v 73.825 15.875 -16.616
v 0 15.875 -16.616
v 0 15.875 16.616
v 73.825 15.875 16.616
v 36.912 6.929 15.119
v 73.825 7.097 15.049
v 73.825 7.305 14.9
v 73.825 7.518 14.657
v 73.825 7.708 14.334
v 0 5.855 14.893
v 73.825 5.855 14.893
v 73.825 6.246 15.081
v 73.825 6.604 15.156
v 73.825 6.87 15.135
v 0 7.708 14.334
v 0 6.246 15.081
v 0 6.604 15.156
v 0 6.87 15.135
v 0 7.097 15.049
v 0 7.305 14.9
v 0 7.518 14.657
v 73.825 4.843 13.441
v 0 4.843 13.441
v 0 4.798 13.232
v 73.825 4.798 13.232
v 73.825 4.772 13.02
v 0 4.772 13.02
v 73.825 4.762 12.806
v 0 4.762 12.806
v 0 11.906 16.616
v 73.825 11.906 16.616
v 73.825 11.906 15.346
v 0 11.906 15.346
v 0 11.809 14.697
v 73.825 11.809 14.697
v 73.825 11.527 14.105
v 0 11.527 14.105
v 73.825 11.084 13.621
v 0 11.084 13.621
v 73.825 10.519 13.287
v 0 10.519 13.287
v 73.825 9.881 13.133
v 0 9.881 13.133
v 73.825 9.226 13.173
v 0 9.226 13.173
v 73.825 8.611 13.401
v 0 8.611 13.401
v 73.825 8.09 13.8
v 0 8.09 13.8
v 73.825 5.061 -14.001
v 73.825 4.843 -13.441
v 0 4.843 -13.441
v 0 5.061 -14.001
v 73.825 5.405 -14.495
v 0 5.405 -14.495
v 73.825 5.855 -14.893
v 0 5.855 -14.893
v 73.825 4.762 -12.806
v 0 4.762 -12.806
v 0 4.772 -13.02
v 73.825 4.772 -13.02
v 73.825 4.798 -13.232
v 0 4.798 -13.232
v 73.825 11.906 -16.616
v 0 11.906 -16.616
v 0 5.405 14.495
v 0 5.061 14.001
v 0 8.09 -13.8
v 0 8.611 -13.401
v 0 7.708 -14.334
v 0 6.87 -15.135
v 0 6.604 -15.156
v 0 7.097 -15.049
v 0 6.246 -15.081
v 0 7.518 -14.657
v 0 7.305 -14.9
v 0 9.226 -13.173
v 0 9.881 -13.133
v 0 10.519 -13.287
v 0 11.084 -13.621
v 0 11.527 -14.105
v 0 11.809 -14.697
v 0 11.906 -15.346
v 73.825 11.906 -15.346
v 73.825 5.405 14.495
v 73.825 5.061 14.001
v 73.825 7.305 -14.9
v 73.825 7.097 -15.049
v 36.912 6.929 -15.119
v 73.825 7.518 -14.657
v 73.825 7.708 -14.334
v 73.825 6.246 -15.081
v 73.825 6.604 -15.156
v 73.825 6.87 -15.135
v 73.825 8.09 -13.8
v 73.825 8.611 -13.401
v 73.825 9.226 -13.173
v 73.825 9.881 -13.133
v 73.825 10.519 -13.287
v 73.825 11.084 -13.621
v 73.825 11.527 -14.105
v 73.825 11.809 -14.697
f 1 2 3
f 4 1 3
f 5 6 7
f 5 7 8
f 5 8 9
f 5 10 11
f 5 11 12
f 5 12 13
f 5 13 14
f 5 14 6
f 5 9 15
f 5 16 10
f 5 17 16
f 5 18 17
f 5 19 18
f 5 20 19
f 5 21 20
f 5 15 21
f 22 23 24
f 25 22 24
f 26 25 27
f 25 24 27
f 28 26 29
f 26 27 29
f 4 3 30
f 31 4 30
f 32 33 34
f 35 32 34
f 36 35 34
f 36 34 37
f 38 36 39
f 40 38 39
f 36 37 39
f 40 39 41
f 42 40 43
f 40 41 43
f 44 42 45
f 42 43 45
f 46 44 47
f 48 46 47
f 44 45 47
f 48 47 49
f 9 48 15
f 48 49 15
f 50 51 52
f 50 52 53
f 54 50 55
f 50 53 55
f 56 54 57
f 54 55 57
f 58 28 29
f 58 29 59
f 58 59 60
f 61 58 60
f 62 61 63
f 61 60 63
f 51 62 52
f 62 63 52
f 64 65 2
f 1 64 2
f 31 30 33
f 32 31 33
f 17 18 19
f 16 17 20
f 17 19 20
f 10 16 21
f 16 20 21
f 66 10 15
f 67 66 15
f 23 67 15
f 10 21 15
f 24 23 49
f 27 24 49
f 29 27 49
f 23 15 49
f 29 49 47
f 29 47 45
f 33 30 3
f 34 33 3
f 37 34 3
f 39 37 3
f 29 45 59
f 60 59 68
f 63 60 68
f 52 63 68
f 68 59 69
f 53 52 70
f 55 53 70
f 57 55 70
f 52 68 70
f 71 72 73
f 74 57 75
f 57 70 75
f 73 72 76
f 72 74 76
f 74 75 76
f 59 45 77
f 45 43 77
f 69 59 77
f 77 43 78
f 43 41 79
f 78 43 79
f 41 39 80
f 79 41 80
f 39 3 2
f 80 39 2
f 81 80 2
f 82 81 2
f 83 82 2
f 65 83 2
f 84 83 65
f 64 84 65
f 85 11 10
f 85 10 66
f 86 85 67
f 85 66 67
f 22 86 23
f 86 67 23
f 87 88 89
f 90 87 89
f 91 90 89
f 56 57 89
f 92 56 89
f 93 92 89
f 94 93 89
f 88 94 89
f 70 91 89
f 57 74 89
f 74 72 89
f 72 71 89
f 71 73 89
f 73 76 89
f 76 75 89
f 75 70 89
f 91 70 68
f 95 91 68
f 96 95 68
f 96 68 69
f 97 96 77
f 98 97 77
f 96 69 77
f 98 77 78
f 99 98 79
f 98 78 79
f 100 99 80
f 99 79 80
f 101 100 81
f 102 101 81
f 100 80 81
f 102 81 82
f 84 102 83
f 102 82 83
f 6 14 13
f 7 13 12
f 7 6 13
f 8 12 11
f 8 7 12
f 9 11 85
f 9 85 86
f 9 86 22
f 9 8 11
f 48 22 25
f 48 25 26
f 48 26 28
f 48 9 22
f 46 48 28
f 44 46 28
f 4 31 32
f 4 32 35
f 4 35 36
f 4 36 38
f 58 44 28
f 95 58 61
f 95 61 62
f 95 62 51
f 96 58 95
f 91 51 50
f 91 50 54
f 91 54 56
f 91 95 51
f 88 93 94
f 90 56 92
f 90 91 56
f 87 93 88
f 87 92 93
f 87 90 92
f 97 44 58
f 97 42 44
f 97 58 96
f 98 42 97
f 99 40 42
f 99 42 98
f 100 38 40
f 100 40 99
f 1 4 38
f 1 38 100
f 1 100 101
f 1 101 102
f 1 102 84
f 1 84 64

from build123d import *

# Parameters (mm, degrees)
BOSS_EXTRUDE1_DEPTH = 73.824999924


with BuildPart() as part:
    # Sketch1 → Boss-Extrude1 (new body)
    with BuildSketch(Plane(origin=(0, 0, 0), x_dir=(0, 0, -1), z_dir=(1, 0, 0))):
        with BuildLine():
            Line((-15.345833333, 15.875), (-16.615833333, 15.875))
            Line((-16.615833333, 15.875), (-16.615833333, 11.90625))
            Line((-16.615833333, 11.90625), (-15.345833333, 11.90625))
            ThreePointArc((-15.345833333, 11.90625), (-13.186497119, 10.205674607), (-14.333561104, 7.707888834))
            add(Edge.make_bspline(
                [(-14.893216846, 5.855285409), (-15.624772824, 7.07621566), (-14.333561104, 7.707888834)],
                knots=[0, 0, 0, 1, 1, 1], degree=2))
            ThreePointArc((-14.893216846, 5.855285409), (-14.258115568, 5.218639085), (-13.44097879, 4.843193137))
            ThreePointArc((-13.44097879, 4.843193137), (-13.125958752, 4.782754037), (-12.805833333, 4.7625))
            Line((-12.805833333, 4.7625), (12.805833333, 4.7625))
            ThreePointArc((12.805833333, 4.7625), (13.125958752, 4.782754037), (13.44097879, 4.843193137))
            ThreePointArc((13.44097879, 4.843193137), (14.258115568, 5.218639085), (14.893216846, 5.855285409))
            add(Edge.make_bspline(
                [(14.893216846, 5.855285409), (15.624772824, 7.07621566), (14.333561104, 7.707888834)],
                knots=[0, 0, 0, 1, 1, 1], degree=2))
            ThreePointArc((14.333561104, 7.707888834), (13.186497119, 10.205674607), (15.345833333, 11.90625))
            Line((15.345833333, 11.90625), (16.615833333, 11.90625))
            Line((16.615833333, 11.90625), (16.615833333, 15.875))
            Line((16.615833333, 15.875), (15.345833333, 15.875))
            Line((15.345833333, 15.875), (-15.345833333, 15.875))
        make_face()
    extrude(amount=BOSS_EXTRUDE1_DEPTH)


solid = part.part
